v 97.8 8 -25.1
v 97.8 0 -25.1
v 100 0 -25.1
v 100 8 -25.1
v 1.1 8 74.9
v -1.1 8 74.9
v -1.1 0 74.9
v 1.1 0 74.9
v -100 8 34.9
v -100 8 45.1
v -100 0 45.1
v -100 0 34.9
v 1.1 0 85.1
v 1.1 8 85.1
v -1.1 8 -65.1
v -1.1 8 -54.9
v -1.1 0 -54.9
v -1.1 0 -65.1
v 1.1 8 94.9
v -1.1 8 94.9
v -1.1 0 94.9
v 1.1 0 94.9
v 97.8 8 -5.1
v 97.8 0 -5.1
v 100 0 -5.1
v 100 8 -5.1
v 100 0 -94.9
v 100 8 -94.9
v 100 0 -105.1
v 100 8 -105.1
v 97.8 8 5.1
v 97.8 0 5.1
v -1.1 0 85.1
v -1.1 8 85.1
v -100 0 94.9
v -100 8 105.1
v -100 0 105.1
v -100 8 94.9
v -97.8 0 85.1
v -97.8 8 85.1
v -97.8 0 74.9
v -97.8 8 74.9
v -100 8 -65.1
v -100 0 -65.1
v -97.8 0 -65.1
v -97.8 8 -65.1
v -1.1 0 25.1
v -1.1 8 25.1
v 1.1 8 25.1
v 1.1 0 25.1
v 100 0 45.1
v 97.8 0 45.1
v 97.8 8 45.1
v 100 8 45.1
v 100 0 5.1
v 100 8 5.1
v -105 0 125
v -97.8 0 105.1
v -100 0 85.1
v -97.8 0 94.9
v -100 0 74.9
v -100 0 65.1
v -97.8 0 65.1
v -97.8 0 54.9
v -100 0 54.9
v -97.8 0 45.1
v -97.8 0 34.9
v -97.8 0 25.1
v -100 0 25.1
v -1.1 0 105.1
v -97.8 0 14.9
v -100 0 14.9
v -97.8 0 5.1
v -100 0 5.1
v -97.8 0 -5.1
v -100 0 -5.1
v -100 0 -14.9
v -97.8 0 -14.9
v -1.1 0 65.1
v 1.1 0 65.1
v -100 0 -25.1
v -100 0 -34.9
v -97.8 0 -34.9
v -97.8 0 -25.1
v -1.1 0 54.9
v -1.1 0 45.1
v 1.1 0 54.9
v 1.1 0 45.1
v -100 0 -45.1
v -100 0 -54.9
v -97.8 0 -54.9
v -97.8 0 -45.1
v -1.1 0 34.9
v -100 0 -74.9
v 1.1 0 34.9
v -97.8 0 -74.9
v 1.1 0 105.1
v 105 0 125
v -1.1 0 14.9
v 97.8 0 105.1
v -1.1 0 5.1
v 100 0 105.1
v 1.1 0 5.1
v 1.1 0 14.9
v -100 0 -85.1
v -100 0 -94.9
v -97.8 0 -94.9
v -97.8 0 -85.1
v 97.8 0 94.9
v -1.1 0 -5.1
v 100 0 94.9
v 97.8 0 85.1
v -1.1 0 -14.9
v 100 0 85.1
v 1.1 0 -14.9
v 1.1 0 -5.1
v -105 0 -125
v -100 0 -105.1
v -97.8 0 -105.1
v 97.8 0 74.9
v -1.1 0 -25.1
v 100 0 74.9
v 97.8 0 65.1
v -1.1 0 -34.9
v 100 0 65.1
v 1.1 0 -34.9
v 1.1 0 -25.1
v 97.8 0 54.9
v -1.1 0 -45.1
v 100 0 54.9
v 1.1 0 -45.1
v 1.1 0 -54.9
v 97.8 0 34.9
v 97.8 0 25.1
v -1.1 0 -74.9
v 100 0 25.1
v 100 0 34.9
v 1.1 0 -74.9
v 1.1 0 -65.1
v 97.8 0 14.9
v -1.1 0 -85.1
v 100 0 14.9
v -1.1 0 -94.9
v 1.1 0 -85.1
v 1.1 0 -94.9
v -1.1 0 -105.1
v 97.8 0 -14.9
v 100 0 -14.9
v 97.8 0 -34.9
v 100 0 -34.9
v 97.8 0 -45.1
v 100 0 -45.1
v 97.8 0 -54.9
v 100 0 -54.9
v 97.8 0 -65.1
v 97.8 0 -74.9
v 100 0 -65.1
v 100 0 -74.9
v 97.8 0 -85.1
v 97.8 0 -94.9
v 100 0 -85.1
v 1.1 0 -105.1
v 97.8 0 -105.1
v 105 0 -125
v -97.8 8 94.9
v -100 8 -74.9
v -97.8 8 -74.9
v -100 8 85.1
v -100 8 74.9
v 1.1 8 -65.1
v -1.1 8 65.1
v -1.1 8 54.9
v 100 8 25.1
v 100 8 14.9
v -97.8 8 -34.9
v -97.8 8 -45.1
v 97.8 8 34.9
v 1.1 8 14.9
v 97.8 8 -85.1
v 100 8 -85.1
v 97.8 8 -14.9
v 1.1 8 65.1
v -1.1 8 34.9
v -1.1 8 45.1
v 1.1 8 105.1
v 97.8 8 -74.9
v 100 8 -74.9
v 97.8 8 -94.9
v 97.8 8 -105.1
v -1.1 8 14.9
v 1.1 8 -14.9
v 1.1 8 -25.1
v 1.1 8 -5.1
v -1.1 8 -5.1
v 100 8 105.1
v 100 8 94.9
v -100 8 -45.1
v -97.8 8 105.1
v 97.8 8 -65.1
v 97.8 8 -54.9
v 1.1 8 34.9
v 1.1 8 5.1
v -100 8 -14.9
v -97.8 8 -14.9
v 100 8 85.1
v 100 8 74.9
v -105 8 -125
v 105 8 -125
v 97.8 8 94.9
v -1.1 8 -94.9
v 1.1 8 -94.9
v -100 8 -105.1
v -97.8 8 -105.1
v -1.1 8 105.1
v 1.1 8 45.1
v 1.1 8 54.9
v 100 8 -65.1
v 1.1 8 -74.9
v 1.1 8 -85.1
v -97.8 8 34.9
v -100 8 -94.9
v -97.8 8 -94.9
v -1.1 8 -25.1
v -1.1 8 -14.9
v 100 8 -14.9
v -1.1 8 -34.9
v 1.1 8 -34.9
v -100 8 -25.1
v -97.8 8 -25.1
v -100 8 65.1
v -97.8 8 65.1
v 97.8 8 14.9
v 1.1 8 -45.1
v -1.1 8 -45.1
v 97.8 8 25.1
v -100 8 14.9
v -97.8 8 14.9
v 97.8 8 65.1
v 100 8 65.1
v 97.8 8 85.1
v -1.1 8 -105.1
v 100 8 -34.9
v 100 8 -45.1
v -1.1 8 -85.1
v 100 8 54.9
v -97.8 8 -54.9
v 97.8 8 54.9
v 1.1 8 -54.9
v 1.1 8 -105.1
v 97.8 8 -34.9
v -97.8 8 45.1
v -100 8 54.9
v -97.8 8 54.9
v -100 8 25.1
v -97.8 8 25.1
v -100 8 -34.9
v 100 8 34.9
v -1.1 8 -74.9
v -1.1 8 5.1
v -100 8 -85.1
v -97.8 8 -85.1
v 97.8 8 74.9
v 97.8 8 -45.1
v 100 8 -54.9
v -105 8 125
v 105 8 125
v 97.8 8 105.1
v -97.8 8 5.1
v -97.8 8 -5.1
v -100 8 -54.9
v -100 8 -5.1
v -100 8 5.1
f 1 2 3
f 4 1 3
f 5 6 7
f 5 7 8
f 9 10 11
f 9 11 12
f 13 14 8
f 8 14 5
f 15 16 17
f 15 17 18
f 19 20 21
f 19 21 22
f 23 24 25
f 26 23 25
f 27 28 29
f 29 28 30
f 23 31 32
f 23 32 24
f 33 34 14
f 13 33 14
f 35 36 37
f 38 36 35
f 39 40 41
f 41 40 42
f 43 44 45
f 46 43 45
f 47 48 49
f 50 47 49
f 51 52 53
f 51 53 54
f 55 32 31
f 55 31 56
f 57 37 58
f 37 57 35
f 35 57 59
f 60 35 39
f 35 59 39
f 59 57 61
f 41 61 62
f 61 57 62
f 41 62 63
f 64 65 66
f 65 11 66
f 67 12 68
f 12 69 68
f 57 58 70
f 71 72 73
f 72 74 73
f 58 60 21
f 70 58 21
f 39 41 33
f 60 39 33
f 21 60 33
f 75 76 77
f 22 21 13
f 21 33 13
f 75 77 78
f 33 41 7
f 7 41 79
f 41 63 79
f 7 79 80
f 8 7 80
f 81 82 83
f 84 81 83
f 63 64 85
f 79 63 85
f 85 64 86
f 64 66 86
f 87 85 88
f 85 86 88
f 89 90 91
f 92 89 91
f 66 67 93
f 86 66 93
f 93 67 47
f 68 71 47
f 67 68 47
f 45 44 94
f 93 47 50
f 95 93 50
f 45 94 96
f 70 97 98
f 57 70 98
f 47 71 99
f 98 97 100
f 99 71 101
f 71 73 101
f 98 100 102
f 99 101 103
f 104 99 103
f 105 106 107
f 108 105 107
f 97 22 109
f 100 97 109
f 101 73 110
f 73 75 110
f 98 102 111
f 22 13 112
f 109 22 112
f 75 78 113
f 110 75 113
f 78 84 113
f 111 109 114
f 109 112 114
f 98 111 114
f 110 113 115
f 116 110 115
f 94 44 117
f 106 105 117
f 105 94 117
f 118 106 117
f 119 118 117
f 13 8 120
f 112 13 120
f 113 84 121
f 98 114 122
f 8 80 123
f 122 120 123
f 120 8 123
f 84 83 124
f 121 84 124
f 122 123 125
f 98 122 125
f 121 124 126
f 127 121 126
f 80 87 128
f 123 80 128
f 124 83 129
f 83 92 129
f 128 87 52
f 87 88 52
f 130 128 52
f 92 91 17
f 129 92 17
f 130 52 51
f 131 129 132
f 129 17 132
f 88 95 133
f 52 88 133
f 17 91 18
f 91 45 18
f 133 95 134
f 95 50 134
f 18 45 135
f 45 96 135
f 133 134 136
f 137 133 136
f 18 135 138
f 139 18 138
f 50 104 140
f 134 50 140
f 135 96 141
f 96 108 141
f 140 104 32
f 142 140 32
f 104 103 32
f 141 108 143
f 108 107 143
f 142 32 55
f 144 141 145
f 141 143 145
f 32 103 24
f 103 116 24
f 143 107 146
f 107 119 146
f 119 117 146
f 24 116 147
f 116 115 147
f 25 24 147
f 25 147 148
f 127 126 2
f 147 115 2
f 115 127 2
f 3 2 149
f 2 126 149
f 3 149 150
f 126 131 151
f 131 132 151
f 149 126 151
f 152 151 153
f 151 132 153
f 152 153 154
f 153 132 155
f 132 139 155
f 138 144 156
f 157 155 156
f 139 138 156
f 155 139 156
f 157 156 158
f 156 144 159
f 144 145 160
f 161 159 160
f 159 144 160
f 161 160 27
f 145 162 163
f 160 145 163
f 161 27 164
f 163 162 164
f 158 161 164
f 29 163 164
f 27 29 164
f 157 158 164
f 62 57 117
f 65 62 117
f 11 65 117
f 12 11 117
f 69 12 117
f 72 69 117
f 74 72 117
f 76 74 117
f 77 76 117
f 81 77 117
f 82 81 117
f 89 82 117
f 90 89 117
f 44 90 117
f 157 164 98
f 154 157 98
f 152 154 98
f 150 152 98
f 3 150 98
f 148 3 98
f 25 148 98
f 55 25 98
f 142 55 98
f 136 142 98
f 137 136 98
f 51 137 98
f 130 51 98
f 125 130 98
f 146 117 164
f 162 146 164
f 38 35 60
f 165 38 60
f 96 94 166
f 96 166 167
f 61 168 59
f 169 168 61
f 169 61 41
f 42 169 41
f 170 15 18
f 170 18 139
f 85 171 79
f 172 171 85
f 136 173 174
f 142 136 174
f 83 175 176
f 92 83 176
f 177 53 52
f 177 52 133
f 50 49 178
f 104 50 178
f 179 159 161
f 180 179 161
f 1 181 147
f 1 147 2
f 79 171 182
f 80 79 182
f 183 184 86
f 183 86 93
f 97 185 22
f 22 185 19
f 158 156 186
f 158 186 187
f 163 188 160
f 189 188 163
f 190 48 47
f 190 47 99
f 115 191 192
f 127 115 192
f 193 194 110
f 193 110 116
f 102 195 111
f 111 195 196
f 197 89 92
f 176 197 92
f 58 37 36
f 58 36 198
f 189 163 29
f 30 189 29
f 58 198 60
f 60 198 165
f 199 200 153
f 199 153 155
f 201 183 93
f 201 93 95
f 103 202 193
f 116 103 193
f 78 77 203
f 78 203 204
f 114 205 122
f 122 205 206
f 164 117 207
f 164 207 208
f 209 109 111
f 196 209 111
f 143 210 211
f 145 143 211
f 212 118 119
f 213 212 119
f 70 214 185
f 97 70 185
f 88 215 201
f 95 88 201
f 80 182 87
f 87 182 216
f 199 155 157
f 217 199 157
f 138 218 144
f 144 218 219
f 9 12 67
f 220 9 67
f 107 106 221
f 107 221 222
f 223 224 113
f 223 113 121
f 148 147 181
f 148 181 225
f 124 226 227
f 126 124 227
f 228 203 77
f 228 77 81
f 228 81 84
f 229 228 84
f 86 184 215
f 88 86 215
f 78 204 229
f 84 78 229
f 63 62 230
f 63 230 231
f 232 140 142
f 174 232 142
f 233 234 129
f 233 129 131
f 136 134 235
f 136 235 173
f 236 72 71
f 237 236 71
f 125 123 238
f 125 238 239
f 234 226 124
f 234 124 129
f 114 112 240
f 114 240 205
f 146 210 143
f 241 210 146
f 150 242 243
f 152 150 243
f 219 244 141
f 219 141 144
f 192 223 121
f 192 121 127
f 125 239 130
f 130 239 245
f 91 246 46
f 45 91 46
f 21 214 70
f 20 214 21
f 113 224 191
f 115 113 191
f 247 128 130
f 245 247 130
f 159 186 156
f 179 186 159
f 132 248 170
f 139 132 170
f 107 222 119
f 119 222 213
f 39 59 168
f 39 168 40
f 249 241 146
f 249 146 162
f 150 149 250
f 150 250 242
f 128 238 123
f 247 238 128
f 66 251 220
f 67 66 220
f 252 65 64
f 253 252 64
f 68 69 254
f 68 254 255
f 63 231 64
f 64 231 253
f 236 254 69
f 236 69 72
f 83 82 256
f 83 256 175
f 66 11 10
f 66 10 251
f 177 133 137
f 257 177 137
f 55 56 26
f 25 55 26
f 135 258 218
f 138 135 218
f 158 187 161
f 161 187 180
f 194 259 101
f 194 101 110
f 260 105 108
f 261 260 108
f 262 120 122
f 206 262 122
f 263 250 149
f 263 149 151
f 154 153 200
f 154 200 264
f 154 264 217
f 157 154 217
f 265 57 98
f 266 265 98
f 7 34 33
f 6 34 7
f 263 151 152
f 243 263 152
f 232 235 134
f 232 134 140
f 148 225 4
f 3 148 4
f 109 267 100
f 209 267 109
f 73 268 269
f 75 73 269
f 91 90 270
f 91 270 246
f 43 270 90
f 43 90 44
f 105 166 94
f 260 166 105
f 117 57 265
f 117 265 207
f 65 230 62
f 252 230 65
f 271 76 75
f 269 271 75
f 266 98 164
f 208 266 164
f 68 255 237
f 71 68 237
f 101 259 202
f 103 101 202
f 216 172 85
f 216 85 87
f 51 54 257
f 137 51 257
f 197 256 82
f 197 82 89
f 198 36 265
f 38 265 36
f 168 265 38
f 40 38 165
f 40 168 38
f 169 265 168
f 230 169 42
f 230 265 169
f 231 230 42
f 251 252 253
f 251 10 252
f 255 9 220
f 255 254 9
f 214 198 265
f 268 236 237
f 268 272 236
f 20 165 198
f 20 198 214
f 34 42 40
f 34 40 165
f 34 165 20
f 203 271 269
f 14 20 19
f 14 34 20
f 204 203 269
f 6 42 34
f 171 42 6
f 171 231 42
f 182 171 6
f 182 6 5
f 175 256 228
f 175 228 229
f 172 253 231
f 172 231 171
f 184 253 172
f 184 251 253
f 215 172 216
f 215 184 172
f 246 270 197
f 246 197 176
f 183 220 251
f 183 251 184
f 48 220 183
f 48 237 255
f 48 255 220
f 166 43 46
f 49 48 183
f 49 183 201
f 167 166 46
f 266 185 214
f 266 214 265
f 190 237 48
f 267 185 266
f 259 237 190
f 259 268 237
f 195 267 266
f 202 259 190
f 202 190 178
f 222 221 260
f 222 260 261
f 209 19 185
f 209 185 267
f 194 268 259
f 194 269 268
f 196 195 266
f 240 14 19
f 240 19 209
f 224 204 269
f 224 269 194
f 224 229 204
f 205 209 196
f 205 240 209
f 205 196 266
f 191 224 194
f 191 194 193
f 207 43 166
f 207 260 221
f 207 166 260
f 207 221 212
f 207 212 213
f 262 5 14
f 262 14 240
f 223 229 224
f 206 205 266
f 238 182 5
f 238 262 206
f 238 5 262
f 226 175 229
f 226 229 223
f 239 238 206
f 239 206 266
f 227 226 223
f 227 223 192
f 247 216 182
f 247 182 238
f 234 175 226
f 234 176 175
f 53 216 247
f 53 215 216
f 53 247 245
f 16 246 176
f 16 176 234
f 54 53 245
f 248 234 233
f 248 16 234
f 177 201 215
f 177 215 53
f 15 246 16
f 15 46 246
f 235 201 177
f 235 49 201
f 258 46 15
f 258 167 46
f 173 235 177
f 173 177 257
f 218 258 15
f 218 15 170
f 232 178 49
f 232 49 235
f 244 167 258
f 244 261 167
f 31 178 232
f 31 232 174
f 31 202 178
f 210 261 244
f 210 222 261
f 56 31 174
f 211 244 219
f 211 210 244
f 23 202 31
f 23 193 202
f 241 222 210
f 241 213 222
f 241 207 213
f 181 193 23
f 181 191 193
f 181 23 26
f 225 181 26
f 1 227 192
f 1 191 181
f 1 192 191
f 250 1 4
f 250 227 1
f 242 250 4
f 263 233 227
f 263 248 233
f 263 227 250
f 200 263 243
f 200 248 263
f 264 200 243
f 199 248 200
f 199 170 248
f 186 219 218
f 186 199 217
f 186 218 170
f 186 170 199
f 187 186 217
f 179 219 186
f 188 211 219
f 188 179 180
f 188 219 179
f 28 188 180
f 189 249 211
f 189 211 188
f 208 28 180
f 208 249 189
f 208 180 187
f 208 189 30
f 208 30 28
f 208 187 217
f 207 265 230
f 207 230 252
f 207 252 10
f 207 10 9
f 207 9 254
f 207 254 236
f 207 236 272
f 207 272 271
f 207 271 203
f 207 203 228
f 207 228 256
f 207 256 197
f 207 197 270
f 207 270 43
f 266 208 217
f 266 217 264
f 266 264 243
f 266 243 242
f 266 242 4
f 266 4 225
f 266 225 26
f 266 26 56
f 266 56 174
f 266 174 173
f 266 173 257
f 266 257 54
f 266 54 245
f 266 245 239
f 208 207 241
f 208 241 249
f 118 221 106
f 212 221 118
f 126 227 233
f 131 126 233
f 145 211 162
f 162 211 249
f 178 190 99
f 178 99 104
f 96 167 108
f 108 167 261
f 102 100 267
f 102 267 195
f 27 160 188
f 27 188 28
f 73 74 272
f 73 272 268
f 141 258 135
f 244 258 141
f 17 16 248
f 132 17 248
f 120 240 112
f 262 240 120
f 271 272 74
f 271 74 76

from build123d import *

# Parameters (mm, degrees)
SKETCH1_W           = 210
SKETCH1_H           = 250
BOSS_EXTRUDE1_DEPTH = 8
SKETCH_2_W          = 2.2
SKETCH_2_H          = 10.2
CUT_EXTRUDE_3_DEPTH = 164.444180074


with BuildPart() as part:
    # Sketch1 → Boss-Extrude1 (new body)
    with BuildSketch(Plane(origin=(0, 0, 0), x_dir=(1, 0, 0), z_dir=(0, 1, 0))):
        Rectangle(SKETCH1_W, SKETCH1_H)
    extrude(amount=BOSS_EXTRUDE1_DEPTH)

    # 草图2 → 切除-拉伸3 (cut, through all)
    with BuildSketch(Plane(origin=(0, 8, 0), x_dir=(1, 0, 0), z_dir=(0, 1, 0))):
        with Locations((0, -20)):
            Rectangle(SKETCH_2_W, SKETCH_2_H)
        Rectangle(SKETCH_2_W, SKETCH_2_H)
        with Locations((0, 20)):
            Rectangle(SKETCH_2_W, SKETCH_2_H)
        with Locations((0, 40)):
            Rectangle(SKETCH_2_W, SKETCH_2_H)
        with Locations((0, 60)):
            Rectangle(SKETCH_2_W, SKETCH_2_H)
        with Locations((0, 80)):
            Rectangle(SKETCH_2_W, SKETCH_2_H)
        with Locations((0, 100)):
            Rectangle(SKETCH_2_W, SKETCH_2_H)
        with Locations((0, -40)):
            Rectangle(SKETCH_2_W, SKETCH_2_H)
        with Locations((0, -60)):
            Rectangle(SKETCH_2_W, SKETCH_2_H)
        with Locations((0, -80)):
            Rectangle(SKETCH_2_W, SKETCH_2_H)
        with Locations((0, -100)):
            Rectangle(SKETCH_2_W, SKETCH_2_H)
        with Locations((98.9, 0)):
            Rectangle(SKETCH_2_W, SKETCH_2_H)
        with Locations((98.9, 20)):
            Rectangle(SKETCH_2_W, SKETCH_2_H)
        with Locations((-98.9, 0)):
            Rectangle(SKETCH_2_W, SKETCH_2_H)
        with Locations((98.9, 40)):
            Rectangle(SKETCH_2_W, SKETCH_2_H)
        with Locations((98.9, 60)):
            Rectangle(SKETCH_2_W, SKETCH_2_H)
        with Locations((98.9, 80)):
            Rectangle(SKETCH_2_W, SKETCH_2_H)
        with Locations((98.9, 100)):
            Rectangle(SKETCH_2_W, SKETCH_2_H)
        with Locations((98.9, -20)):
            Rectangle(SKETCH_2_W, SKETCH_2_H)
        with Locations((98.9, -40)):
            Rectangle(SKETCH_2_W, SKETCH_2_H)
        with Locations((98.9, -60)):
            Rectangle(SKETCH_2_W, SKETCH_2_H)
        with Locations((98.9, -80)):
            Rectangle(SKETCH_2_W, SKETCH_2_H)
        with Locations((98.9, -100)):
            Rectangle(SKETCH_2_W, SKETCH_2_H)
        with Locations((-98.9, 20)):
            Rectangle(SKETCH_2_W, SKETCH_2_H)
        with Locations((-98.9, 40)):
            Rectangle(SKETCH_2_W, SKETCH_2_H)
        with Locations((-98.9, 60)):
            Rectangle(SKETCH_2_W, SKETCH_2_H)
        with Locations((-98.9, 80)):
            Rectangle(SKETCH_2_W, SKETCH_2_H)
        with Locations((-98.9, 100)):
            Rectangle(SKETCH_2_W, SKETCH_2_H)
        with Locations((-98.9, -20)):
            Rectangle(SKETCH_2_W, SKETCH_2_H)
        with Locations((-98.9, -40)):
            Rectangle(SKETCH_2_W, SKETCH_2_H)
        with Locations((-98.9, -60)):
            Rectangle(SKETCH_2_W, SKETCH_2_H)
        with Locations((-98.9, -80)):
            Rectangle(SKETCH_2_W, SKETCH_2_H)
        with Locations((-98.9, -100)):
            Rectangle(SKETCH_2_W, SKETCH_2_H)
    extrude(amount=-CUT_EXTRUDE_3_DEPTH, mode=Mode.SUBTRACT)


solid = part.part
